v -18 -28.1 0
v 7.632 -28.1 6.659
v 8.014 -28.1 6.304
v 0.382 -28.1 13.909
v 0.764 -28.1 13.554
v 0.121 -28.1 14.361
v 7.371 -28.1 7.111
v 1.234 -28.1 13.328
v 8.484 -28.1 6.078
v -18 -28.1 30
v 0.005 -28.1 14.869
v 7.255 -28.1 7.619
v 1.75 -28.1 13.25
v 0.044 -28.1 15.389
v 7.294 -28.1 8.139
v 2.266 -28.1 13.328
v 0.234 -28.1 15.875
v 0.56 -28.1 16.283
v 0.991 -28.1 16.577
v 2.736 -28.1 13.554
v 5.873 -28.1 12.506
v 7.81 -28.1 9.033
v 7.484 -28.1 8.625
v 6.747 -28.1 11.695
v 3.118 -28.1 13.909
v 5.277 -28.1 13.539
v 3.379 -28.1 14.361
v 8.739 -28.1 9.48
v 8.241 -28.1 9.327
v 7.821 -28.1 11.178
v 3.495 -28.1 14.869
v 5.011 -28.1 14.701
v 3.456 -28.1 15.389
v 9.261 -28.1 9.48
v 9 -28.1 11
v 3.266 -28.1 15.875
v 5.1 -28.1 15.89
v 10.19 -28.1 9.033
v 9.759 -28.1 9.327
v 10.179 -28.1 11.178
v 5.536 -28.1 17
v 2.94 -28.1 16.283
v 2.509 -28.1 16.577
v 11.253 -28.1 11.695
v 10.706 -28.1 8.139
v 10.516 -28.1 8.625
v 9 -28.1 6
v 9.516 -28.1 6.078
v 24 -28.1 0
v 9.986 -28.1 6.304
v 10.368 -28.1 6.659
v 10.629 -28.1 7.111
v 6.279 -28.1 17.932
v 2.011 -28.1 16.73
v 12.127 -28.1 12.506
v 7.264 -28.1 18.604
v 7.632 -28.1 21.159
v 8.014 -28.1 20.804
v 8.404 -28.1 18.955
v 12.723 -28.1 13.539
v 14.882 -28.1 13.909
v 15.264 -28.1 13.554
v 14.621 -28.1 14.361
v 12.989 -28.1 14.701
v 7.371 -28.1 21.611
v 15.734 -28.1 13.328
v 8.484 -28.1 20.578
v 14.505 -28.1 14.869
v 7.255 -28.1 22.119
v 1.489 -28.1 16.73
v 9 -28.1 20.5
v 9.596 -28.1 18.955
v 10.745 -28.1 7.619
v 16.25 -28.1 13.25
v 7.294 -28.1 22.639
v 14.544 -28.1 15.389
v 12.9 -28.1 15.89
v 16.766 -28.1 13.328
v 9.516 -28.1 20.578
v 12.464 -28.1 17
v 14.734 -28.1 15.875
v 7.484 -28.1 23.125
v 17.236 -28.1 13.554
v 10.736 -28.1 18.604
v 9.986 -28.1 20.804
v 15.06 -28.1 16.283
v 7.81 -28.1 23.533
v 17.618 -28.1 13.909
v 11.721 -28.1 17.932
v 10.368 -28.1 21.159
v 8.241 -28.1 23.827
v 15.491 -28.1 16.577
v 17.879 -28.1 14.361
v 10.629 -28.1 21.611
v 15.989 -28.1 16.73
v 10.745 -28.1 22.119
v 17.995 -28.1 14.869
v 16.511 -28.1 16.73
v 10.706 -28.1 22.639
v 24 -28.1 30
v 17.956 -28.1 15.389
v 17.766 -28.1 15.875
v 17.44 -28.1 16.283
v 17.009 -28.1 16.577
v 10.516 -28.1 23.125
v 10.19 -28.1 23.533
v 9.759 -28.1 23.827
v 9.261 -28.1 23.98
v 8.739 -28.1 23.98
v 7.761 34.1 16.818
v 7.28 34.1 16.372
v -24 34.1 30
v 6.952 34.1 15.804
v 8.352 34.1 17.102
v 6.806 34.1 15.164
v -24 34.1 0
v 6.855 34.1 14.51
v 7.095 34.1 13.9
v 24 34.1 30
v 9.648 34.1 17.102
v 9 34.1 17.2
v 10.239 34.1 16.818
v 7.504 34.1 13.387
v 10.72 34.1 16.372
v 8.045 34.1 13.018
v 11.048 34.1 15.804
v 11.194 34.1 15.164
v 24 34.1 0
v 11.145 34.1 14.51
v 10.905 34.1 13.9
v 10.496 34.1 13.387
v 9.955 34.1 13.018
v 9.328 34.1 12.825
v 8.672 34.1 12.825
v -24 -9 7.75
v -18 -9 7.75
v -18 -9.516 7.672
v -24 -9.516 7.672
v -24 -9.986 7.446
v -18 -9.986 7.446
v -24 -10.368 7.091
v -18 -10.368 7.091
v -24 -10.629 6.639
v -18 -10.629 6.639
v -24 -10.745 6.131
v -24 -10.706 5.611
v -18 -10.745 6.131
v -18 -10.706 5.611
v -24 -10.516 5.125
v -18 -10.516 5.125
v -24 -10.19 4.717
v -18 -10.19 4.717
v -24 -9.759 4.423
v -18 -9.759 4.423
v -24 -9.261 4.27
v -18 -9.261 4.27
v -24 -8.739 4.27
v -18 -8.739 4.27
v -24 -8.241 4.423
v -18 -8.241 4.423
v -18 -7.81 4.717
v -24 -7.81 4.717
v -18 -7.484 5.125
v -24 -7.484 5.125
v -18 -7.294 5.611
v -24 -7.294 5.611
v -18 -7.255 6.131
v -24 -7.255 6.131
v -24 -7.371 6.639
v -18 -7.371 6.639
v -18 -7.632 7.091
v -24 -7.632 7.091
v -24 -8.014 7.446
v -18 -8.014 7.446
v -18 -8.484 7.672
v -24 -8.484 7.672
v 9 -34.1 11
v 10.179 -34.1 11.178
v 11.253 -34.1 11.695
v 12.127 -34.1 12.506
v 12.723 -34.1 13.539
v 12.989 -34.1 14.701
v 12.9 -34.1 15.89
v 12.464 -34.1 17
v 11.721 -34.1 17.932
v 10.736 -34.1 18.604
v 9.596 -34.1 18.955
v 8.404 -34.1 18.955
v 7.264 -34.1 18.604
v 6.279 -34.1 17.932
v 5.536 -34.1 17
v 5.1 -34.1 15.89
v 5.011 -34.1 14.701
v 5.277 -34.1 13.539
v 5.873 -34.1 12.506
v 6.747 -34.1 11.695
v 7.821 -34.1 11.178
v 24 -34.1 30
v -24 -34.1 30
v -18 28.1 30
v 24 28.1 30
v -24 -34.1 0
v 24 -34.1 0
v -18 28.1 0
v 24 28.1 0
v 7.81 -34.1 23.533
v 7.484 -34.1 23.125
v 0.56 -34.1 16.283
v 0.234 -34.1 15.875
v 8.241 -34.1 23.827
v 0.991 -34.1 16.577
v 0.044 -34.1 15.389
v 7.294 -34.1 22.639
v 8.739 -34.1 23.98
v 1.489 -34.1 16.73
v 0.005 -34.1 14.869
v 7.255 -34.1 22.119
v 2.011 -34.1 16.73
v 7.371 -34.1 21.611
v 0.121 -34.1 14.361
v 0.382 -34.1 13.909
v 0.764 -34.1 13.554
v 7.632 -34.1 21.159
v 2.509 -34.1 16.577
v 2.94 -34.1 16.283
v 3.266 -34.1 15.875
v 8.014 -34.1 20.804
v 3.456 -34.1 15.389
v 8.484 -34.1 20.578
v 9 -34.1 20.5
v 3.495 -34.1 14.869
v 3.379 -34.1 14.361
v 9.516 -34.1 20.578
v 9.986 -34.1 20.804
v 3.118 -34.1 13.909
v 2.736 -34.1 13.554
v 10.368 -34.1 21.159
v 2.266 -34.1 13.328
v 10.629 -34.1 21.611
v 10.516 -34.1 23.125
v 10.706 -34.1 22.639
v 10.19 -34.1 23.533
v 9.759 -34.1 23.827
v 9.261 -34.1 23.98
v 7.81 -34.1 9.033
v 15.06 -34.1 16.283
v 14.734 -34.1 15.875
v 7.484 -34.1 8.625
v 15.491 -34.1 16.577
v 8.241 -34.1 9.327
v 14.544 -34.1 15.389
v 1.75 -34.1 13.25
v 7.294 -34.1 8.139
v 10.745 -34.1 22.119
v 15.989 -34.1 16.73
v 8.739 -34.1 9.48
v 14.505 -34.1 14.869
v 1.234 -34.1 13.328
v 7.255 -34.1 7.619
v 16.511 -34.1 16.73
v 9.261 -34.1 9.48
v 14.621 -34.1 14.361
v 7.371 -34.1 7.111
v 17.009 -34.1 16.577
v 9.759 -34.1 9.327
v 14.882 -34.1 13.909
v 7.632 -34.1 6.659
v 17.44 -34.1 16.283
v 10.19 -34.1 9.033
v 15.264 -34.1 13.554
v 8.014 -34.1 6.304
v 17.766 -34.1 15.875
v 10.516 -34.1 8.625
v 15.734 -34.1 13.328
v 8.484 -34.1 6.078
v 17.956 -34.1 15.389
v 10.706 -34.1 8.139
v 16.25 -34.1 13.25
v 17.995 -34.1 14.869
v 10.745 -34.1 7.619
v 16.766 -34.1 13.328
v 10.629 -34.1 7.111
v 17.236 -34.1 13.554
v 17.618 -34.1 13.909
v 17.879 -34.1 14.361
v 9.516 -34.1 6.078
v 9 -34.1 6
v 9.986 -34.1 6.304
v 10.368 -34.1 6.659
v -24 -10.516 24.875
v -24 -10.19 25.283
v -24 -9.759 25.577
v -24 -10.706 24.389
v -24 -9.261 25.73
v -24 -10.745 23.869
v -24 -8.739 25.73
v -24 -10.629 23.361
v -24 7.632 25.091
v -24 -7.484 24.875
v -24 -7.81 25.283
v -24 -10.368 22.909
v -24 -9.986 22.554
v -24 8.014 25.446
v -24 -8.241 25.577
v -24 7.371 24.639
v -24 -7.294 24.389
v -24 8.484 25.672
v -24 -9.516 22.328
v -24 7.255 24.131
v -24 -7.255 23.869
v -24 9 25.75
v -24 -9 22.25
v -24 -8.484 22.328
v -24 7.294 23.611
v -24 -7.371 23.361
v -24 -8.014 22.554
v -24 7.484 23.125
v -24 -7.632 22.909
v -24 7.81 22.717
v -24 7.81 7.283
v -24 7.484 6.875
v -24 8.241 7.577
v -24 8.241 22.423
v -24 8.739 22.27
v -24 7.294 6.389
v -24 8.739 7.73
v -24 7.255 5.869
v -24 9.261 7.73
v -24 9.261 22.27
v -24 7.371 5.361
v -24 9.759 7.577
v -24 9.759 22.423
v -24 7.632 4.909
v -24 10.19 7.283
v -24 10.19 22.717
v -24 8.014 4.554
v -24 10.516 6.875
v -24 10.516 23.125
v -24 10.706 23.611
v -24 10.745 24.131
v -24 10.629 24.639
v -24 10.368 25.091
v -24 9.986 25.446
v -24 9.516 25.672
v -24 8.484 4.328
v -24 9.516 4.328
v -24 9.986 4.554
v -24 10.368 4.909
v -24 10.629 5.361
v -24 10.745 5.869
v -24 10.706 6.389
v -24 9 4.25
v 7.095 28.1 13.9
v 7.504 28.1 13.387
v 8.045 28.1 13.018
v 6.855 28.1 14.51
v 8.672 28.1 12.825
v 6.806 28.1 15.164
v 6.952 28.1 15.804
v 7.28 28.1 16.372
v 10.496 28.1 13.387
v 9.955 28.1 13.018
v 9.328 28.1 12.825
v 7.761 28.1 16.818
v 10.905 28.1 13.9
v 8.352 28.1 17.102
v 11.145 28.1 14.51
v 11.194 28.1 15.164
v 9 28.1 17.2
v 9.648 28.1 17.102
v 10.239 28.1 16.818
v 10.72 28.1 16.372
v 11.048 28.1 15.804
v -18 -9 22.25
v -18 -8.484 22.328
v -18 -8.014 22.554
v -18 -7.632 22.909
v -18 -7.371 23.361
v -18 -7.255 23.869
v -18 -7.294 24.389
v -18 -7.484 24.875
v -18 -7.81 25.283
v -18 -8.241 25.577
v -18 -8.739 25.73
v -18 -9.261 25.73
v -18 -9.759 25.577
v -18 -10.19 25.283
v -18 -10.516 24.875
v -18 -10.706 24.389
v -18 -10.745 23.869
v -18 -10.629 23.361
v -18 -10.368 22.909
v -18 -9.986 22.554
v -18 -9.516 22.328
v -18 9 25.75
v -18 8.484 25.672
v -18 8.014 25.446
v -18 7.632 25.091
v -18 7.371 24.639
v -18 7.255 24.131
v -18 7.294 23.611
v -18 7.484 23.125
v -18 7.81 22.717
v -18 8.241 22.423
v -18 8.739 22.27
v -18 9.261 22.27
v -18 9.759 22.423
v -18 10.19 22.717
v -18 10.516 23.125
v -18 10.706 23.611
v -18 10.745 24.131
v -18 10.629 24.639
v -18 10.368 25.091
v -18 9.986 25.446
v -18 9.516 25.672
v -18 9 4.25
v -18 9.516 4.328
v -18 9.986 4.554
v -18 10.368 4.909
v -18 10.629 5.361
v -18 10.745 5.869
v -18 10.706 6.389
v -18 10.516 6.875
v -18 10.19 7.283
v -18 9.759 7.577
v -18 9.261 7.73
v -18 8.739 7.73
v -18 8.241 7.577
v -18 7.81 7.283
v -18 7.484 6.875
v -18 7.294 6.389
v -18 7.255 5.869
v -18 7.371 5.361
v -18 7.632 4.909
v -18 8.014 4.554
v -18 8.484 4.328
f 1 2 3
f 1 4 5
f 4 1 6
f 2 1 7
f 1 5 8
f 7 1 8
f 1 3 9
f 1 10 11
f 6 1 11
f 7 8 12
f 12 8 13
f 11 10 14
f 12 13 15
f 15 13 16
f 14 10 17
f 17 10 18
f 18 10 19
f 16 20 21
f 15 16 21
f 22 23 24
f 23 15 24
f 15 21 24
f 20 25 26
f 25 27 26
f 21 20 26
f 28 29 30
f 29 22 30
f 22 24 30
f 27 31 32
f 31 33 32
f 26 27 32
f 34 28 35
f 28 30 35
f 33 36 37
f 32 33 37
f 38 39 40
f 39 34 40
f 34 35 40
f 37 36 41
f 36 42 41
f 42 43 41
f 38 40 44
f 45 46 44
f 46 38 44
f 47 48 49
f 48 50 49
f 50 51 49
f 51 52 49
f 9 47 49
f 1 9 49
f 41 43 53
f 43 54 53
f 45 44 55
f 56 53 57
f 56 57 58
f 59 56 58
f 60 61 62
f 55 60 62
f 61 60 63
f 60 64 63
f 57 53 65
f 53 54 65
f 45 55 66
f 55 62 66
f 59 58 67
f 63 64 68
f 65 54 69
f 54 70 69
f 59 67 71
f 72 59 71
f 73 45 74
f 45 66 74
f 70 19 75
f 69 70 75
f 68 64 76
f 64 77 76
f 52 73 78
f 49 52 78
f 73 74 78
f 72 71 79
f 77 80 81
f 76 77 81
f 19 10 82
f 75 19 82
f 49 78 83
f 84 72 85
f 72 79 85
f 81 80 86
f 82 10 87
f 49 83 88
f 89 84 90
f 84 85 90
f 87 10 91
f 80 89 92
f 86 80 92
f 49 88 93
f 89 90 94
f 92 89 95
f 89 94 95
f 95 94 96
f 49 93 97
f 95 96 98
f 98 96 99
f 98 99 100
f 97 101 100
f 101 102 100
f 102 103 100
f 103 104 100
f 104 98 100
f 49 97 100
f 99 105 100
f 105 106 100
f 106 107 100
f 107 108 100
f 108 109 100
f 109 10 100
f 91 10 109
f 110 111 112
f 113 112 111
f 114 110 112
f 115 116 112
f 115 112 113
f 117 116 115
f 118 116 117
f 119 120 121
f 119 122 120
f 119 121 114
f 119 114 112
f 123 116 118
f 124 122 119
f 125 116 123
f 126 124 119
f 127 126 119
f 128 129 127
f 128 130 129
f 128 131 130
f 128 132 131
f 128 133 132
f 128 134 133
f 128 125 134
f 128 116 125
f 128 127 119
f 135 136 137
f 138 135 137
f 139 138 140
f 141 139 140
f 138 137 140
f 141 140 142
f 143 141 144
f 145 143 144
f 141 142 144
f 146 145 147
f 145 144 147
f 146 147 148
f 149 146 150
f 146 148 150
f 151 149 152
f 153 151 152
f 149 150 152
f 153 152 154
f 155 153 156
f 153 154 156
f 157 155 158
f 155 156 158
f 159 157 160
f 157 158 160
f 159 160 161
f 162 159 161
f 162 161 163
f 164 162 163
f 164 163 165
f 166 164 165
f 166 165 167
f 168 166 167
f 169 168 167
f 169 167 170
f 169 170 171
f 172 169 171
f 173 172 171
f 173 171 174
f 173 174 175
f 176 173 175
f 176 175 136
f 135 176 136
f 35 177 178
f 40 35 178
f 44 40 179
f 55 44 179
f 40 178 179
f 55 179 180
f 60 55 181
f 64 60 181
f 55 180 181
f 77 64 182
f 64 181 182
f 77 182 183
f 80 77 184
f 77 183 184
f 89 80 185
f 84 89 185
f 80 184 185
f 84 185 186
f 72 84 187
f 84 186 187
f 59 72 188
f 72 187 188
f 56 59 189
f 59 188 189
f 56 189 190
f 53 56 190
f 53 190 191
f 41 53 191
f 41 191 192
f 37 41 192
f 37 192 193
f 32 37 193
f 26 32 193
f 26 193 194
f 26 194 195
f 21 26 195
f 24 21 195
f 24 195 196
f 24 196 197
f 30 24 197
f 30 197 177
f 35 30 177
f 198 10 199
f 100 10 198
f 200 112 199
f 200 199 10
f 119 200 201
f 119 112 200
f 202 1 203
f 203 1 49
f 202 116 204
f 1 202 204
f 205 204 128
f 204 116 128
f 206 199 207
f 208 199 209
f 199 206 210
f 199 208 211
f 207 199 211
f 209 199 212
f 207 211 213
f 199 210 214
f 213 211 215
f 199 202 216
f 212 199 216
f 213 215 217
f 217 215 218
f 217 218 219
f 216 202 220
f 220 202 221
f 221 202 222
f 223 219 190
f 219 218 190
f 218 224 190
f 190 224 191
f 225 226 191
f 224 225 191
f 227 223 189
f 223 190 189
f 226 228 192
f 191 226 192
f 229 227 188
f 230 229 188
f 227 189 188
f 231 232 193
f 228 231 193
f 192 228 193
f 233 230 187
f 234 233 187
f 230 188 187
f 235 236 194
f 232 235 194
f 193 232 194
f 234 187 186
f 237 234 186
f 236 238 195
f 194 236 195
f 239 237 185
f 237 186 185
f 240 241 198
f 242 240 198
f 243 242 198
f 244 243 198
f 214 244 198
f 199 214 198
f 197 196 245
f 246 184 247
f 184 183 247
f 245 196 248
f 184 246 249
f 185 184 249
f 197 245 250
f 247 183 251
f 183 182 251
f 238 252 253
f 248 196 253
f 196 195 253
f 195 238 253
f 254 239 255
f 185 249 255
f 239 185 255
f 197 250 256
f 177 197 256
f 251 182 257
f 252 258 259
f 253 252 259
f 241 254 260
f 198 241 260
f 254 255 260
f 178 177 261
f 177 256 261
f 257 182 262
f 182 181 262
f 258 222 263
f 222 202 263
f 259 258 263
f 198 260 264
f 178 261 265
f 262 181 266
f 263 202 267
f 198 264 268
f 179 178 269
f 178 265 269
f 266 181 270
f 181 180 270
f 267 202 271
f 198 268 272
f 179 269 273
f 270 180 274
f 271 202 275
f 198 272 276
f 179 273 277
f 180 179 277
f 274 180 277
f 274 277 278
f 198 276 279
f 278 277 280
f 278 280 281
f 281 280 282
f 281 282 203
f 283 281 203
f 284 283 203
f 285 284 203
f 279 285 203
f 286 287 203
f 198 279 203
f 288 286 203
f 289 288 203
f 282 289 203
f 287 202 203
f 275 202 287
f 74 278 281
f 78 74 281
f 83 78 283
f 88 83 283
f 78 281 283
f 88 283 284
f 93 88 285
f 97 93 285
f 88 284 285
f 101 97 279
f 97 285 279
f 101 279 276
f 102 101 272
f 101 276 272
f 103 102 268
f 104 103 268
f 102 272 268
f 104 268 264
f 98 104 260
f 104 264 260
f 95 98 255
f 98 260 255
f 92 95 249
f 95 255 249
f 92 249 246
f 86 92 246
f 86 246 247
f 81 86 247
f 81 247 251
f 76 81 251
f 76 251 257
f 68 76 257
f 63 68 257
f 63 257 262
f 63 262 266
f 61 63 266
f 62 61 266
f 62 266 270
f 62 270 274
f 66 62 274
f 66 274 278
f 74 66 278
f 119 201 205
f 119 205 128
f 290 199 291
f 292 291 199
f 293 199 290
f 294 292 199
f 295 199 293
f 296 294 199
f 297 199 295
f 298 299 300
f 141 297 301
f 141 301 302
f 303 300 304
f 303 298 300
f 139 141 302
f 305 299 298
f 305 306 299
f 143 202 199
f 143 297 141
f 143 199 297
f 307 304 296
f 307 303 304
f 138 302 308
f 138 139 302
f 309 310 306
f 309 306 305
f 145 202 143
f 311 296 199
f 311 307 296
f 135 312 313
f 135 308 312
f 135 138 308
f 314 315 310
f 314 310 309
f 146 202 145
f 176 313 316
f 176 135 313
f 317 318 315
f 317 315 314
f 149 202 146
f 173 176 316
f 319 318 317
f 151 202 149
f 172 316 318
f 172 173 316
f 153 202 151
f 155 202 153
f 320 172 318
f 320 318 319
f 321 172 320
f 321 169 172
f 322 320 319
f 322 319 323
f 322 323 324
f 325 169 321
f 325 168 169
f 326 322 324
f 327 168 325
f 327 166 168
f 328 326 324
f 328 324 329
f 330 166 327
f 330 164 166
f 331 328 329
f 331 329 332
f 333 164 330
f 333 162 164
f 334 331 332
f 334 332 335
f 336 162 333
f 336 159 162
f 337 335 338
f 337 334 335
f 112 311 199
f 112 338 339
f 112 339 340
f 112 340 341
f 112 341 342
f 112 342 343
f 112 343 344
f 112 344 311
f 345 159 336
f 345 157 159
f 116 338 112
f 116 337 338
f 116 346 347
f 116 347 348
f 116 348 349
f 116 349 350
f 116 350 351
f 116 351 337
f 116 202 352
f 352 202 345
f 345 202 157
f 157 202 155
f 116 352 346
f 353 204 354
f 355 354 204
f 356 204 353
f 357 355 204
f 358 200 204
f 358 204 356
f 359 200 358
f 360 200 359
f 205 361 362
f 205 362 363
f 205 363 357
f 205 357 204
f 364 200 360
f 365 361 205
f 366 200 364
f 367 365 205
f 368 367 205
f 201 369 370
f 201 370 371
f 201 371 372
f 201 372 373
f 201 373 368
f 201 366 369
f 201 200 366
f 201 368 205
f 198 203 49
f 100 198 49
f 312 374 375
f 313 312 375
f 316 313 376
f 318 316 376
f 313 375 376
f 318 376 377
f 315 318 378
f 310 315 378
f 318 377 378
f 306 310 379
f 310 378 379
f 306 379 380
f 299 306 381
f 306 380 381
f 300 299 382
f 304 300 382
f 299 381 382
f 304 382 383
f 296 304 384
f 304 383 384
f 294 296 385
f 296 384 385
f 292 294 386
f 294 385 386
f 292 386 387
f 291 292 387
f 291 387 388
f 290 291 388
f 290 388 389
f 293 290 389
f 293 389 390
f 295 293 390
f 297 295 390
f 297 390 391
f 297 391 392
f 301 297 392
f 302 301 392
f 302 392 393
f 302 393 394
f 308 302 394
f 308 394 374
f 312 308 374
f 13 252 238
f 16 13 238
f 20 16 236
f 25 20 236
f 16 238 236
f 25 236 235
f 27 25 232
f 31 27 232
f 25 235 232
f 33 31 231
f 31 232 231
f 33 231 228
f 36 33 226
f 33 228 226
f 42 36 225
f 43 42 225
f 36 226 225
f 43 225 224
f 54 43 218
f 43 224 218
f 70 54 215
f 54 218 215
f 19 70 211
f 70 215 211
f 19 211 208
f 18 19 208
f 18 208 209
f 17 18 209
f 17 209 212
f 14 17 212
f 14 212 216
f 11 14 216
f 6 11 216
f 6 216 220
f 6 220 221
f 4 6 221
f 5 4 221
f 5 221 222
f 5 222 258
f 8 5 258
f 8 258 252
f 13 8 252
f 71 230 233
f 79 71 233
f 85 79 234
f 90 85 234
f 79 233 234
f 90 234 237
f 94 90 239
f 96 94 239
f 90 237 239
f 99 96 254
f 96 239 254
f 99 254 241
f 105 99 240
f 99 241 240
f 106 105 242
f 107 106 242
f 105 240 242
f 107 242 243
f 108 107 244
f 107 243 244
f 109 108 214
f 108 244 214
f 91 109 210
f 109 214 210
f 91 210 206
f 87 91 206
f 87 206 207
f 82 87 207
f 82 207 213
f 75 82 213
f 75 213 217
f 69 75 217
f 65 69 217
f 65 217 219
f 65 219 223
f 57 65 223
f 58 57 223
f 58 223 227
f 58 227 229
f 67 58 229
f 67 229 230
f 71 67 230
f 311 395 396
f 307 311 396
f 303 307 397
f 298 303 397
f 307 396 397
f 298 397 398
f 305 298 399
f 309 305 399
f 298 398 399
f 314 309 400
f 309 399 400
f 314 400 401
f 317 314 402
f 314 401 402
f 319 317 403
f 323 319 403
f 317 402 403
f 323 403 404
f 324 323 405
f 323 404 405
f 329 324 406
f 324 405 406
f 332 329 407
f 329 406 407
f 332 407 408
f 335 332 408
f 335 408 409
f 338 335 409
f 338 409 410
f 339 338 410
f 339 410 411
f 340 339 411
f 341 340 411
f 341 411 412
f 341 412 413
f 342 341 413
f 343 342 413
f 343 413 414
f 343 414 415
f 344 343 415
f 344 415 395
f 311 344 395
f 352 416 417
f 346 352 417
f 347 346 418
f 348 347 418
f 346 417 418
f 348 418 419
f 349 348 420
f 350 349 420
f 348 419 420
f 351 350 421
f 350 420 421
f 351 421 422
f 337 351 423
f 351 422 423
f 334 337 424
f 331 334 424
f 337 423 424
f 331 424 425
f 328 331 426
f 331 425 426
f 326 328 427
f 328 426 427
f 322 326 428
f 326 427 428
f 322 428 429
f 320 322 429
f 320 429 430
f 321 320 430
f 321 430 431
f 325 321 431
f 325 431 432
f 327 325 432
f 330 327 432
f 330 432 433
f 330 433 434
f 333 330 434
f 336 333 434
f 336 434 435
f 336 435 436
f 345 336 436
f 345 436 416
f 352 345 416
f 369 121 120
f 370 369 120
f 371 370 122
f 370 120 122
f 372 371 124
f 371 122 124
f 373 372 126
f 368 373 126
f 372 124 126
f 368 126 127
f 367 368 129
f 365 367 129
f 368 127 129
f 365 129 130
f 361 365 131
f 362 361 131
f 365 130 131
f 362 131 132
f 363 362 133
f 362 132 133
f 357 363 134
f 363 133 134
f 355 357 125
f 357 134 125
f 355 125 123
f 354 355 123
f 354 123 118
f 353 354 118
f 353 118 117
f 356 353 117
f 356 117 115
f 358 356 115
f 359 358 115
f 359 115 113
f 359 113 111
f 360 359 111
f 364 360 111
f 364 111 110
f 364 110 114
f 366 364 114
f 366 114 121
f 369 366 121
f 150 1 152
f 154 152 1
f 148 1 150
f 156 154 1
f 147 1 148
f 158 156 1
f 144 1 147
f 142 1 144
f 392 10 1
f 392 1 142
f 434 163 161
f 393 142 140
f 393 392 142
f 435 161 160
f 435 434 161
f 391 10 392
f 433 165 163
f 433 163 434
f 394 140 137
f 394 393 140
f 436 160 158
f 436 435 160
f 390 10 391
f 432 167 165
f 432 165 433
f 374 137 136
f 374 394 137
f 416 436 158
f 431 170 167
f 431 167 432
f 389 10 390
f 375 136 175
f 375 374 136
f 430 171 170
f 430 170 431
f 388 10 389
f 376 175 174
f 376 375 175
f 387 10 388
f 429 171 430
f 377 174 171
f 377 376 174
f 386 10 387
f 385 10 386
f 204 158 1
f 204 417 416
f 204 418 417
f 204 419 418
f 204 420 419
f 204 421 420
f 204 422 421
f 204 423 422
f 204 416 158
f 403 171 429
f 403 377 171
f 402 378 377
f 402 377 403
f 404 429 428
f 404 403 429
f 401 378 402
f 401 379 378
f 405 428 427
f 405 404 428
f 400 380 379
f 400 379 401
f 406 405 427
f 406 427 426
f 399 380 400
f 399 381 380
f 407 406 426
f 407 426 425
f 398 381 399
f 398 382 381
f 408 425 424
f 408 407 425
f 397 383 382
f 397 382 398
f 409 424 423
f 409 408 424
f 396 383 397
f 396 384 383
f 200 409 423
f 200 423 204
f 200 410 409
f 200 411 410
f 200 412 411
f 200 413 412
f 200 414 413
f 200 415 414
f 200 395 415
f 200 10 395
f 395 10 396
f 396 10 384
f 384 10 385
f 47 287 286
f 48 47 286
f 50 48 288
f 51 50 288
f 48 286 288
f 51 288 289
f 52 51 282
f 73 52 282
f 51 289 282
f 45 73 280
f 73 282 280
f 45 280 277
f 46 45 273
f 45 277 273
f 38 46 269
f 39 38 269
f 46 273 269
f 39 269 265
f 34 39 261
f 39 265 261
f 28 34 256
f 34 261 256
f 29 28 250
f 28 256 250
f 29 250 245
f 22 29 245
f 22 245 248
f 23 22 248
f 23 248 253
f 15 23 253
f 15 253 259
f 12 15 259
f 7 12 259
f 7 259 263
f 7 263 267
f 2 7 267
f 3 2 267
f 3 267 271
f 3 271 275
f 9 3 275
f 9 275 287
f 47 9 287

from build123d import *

# Parameters (mm, degrees)
SKETCH1_W           = 48
SKETCH1_H           = 68.2
BOSS_EXTRUDE1_DEPTH = 30
SKETCH2_W           = 42
SKETCH2_H           = 56.2
CUT_EXTRUDE1_DEPTH  = 52.369348838
SKETCH4_R           = 4
SKETCH4_R_2         = 1.75
CUT_EXTRUDE3_DEPTH  = 30
SKETCH5_R           = 2.2
CUT_EXTRUDE4_DEPTH  = 30
SKETCH6_R           = 1.75
CUT_EXTRUDE5_DEPTH  = 62.861215636


with BuildPart() as part:
    # Sketch1 → Boss-Extrude1 (new body)
    with BuildSketch(Plane.XY):
        Rectangle(SKETCH1_W, SKETCH1_H)
    extrude(amount=BOSS_EXTRUDE1_DEPTH)

    # Sketch2 → Cut-Extrude1 (cut, through all)
    with BuildSketch(Plane.XY.offset(30)):
        with Locations((3, 0)):
            Rectangle(SKETCH2_W, SKETCH2_H)
    extrude(amount=-CUT_EXTRUDE1_DEPTH, mode=Mode.SUBTRACT)

    # Sketch4 → Cut-Extrude3 (cut)
    with BuildSketch(Plane.XZ.offset(34.1)):
        with Locations(Location((9, 15, 0), (0, 0, 270))):
            Circle(SKETCH4_R)
        with Locations(Location((9, 22.25, 0), (0, 0, 270))):
            Circle(SKETCH4_R_2)
        with Locations(Location((16.25, 15, 0), (0, 0, 270))):
            Circle(SKETCH4_R_2)
        with Locations(Location((9, 7.75, 0), (0, 0, 270))):
            Circle(SKETCH4_R_2)
        with Locations(Location((1.75, 15, 0), (0, 0, 270))):
            Circle(SKETCH4_R_2)
    extrude(amount=-CUT_EXTRUDE3_DEPTH, mode=Mode.SUBTRACT)

    # Sketch5 → Cut-Extrude4 (cut)
    with BuildSketch(Plane(origin=(0, 34.1, 0), x_dir=(1, 0, 0), z_dir=(0, 1, 0))):
        with Locations(Location((9, -15, 0), (0, 0, 270))):
            Circle(SKETCH5_R)
    extrude(amount=-CUT_EXTRUDE4_DEPTH, mode=Mode.SUBTRACT)

    # Sketch6 → Cut-Extrude5 (cut, through all)
    with BuildSketch(Plane(origin=(-18, 0, 0), x_dir=(0, 0, -1), z_dir=(1, 0, 0))):
        with Locations((-24, -9)):
            Circle(SKETCH6_R)
        with Locations(Location((-6, -9, 0), (0, 0, 180))):
            Circle(SKETCH6_R)
        with Locations((-6, 9)):
            Circle(SKETCH6_R)
        with Locations(Location((-24, 9, 0), (0, 0, 180))):
            Circle(SKETCH6_R)
    extrude(amount=-CUT_EXTRUDE5_DEPTH, mode=Mode.SUBTRACT)


solid = part.part
